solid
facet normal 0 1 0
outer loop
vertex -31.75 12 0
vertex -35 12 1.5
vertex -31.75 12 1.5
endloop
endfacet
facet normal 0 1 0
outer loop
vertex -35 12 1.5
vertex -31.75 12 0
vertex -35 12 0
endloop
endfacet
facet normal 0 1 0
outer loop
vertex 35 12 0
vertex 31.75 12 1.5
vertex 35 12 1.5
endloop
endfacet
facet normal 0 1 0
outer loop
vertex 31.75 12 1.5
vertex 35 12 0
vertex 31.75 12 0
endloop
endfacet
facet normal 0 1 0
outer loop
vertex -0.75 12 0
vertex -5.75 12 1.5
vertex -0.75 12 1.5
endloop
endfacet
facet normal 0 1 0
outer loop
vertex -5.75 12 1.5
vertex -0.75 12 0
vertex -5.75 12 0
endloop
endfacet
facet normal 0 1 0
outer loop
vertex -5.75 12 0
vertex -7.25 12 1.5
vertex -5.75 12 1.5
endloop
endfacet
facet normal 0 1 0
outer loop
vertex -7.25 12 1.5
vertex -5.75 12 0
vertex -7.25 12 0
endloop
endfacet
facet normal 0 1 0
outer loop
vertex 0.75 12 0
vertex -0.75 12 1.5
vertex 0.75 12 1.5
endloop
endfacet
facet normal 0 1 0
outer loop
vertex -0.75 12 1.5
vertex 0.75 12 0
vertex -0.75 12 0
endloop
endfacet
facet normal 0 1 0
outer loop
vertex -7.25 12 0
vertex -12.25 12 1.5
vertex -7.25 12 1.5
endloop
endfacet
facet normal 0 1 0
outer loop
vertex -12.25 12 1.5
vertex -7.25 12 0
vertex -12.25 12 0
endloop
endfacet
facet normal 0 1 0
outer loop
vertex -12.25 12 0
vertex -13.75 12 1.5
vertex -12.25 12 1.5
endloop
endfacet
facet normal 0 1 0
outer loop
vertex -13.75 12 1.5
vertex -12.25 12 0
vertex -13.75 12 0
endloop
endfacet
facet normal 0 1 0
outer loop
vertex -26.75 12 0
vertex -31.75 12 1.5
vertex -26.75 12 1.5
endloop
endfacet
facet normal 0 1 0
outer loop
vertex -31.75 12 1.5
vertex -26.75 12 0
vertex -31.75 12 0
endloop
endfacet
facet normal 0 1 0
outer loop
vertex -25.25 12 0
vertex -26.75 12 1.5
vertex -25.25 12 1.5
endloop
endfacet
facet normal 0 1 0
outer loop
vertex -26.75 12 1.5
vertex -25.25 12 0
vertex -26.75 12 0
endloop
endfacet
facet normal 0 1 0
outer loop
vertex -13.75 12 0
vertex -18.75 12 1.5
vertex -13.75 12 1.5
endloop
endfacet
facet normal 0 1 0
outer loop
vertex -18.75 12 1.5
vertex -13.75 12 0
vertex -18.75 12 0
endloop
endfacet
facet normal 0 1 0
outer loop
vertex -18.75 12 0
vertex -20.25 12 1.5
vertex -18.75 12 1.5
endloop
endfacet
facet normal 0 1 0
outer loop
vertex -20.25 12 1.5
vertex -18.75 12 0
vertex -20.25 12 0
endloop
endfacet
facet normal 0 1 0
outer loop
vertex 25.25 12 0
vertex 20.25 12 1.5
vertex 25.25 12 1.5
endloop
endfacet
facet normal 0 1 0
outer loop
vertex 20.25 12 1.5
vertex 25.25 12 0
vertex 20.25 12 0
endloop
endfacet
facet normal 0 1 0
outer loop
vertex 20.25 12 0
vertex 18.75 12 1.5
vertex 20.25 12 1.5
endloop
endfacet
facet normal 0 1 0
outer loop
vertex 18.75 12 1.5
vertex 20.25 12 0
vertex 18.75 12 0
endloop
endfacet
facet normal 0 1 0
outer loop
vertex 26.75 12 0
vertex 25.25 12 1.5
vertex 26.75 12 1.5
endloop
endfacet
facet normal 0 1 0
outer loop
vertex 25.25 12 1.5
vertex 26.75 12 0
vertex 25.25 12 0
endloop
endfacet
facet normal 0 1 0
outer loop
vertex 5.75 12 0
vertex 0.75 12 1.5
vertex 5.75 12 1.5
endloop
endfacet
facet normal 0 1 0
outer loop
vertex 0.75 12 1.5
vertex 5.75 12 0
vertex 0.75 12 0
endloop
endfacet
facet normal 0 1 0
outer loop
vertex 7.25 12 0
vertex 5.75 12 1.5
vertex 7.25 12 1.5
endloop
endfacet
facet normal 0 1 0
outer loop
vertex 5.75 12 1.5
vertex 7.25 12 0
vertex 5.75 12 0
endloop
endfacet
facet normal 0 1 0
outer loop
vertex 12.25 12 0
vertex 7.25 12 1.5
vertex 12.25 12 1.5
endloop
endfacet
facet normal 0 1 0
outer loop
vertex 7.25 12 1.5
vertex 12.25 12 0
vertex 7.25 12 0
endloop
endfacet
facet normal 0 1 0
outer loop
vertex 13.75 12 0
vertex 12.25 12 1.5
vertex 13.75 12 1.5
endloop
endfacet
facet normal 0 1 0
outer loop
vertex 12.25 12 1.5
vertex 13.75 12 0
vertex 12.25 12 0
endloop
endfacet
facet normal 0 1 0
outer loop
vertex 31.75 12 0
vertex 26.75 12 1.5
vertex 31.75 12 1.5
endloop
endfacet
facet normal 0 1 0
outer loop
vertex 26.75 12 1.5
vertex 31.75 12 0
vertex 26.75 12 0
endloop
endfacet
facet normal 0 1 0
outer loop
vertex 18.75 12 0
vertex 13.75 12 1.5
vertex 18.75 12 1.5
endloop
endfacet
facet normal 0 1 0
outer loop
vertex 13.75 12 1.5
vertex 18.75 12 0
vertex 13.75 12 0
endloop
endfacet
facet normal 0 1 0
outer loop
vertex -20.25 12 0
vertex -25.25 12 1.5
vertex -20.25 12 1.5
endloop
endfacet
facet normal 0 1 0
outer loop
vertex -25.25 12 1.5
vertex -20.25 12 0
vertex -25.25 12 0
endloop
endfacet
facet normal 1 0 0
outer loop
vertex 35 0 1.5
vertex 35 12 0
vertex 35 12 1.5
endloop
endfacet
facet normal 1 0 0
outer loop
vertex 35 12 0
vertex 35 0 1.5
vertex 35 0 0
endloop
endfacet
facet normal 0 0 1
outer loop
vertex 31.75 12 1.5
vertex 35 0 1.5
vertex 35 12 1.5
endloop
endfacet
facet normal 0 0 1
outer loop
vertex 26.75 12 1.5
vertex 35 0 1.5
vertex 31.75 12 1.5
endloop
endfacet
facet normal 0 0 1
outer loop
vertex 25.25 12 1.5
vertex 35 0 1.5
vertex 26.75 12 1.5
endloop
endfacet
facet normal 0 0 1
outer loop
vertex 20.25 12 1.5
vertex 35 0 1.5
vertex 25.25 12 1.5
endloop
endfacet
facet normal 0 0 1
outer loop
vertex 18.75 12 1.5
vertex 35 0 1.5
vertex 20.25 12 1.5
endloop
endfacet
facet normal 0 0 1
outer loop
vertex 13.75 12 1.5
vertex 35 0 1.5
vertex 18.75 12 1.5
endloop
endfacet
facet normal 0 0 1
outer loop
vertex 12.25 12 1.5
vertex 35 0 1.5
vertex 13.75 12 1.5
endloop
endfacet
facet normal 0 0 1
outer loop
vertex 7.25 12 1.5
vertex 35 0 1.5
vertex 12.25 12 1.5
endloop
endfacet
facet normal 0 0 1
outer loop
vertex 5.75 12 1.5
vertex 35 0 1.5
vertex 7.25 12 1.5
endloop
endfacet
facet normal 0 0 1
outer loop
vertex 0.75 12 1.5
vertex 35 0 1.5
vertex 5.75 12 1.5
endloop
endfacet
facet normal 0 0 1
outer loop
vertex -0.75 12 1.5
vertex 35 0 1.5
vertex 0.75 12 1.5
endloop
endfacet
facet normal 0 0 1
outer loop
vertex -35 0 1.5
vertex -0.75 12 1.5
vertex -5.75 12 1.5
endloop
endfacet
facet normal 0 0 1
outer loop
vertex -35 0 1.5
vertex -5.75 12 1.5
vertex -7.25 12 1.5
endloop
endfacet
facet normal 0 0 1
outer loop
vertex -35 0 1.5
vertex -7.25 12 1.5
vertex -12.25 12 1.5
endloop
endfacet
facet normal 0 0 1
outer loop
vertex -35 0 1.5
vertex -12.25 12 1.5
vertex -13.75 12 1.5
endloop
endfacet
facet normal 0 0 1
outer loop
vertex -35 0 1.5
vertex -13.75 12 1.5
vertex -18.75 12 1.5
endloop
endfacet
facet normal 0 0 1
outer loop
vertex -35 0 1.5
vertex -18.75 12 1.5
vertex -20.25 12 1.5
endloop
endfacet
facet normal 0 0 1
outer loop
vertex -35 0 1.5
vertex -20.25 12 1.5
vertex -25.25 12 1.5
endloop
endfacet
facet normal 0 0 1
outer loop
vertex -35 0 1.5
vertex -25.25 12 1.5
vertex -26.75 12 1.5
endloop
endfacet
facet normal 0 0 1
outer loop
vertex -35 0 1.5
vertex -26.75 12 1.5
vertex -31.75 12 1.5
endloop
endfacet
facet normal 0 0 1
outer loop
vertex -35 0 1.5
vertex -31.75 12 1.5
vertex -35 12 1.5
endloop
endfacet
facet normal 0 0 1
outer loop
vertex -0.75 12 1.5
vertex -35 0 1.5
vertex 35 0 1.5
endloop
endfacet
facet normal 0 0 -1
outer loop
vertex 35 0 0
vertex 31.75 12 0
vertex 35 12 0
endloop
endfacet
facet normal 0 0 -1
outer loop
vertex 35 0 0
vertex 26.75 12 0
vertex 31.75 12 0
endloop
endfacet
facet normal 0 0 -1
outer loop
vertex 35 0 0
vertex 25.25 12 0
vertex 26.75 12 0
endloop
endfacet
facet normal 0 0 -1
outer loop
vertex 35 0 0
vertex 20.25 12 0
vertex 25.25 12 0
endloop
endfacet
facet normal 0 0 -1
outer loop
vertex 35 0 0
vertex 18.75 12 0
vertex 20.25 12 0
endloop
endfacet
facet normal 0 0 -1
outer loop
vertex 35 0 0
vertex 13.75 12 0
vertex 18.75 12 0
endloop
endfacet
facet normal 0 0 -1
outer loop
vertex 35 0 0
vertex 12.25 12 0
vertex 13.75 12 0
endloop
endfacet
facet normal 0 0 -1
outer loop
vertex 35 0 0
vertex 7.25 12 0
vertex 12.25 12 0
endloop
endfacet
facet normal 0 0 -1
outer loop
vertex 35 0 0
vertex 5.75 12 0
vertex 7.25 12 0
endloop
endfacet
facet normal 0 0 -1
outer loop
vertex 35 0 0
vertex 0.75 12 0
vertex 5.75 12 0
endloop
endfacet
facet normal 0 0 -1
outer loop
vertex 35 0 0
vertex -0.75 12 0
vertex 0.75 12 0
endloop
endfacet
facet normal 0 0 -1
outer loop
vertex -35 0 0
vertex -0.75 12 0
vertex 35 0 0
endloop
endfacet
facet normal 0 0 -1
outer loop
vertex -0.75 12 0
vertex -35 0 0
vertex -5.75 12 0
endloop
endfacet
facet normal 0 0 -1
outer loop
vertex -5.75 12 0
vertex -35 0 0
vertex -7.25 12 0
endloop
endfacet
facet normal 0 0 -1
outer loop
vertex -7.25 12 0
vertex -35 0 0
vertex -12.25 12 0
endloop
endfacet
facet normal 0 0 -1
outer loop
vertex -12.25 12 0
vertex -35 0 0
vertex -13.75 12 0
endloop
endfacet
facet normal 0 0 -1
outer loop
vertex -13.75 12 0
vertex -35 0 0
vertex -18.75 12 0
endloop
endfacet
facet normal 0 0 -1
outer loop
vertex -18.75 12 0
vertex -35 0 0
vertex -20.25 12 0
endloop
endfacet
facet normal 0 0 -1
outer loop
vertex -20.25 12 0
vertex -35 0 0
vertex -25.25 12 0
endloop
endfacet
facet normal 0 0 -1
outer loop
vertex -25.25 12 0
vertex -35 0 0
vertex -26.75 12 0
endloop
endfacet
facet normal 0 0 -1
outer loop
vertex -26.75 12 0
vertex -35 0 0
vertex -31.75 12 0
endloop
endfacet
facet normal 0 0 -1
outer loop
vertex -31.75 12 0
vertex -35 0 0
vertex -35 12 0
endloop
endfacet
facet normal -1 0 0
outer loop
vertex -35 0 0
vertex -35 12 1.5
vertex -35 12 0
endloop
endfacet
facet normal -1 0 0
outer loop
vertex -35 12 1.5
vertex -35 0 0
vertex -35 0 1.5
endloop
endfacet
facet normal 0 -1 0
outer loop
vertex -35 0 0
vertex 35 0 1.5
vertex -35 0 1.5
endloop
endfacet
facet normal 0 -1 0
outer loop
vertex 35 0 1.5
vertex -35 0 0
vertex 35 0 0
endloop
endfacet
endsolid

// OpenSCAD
// 10-well agarose gel comb - printed lying flat
// Units: mm

$fn = 64;

// ---- Dimensions ----
spine_len    = 70;    // spine length (X)
spine_wid    = 12;    // spine width (Y)
plate_t      = 1.5;   // plate thickness (Z)
tooth_w      = 5.0;   // tooth width (X)
tooth_len    = 12;    // tooth length (Y)
gap          = 1.5;   // tooth gap (X)
n_teeth      = 10;    // number of teeth
eps          = 0.5;   // cutter overshoot

pitch        = tooth_w + gap;
row_start_x  = -(n_teeth * tooth_w + (n_teeth - 1) * gap) / 2;

// ---- Model ----
difference() {
    // Spine
    translate([-spine_len/2, 0, 0])
        cube([spine_len, spine_wid, plate_t]);

    // Teeth
    for (i = [0 : n_teeth - 1])
        translate([row_start_x + i * pitch, tooth_len, 0])
            cube([tooth_w, tooth_len, plate_t]);
}
